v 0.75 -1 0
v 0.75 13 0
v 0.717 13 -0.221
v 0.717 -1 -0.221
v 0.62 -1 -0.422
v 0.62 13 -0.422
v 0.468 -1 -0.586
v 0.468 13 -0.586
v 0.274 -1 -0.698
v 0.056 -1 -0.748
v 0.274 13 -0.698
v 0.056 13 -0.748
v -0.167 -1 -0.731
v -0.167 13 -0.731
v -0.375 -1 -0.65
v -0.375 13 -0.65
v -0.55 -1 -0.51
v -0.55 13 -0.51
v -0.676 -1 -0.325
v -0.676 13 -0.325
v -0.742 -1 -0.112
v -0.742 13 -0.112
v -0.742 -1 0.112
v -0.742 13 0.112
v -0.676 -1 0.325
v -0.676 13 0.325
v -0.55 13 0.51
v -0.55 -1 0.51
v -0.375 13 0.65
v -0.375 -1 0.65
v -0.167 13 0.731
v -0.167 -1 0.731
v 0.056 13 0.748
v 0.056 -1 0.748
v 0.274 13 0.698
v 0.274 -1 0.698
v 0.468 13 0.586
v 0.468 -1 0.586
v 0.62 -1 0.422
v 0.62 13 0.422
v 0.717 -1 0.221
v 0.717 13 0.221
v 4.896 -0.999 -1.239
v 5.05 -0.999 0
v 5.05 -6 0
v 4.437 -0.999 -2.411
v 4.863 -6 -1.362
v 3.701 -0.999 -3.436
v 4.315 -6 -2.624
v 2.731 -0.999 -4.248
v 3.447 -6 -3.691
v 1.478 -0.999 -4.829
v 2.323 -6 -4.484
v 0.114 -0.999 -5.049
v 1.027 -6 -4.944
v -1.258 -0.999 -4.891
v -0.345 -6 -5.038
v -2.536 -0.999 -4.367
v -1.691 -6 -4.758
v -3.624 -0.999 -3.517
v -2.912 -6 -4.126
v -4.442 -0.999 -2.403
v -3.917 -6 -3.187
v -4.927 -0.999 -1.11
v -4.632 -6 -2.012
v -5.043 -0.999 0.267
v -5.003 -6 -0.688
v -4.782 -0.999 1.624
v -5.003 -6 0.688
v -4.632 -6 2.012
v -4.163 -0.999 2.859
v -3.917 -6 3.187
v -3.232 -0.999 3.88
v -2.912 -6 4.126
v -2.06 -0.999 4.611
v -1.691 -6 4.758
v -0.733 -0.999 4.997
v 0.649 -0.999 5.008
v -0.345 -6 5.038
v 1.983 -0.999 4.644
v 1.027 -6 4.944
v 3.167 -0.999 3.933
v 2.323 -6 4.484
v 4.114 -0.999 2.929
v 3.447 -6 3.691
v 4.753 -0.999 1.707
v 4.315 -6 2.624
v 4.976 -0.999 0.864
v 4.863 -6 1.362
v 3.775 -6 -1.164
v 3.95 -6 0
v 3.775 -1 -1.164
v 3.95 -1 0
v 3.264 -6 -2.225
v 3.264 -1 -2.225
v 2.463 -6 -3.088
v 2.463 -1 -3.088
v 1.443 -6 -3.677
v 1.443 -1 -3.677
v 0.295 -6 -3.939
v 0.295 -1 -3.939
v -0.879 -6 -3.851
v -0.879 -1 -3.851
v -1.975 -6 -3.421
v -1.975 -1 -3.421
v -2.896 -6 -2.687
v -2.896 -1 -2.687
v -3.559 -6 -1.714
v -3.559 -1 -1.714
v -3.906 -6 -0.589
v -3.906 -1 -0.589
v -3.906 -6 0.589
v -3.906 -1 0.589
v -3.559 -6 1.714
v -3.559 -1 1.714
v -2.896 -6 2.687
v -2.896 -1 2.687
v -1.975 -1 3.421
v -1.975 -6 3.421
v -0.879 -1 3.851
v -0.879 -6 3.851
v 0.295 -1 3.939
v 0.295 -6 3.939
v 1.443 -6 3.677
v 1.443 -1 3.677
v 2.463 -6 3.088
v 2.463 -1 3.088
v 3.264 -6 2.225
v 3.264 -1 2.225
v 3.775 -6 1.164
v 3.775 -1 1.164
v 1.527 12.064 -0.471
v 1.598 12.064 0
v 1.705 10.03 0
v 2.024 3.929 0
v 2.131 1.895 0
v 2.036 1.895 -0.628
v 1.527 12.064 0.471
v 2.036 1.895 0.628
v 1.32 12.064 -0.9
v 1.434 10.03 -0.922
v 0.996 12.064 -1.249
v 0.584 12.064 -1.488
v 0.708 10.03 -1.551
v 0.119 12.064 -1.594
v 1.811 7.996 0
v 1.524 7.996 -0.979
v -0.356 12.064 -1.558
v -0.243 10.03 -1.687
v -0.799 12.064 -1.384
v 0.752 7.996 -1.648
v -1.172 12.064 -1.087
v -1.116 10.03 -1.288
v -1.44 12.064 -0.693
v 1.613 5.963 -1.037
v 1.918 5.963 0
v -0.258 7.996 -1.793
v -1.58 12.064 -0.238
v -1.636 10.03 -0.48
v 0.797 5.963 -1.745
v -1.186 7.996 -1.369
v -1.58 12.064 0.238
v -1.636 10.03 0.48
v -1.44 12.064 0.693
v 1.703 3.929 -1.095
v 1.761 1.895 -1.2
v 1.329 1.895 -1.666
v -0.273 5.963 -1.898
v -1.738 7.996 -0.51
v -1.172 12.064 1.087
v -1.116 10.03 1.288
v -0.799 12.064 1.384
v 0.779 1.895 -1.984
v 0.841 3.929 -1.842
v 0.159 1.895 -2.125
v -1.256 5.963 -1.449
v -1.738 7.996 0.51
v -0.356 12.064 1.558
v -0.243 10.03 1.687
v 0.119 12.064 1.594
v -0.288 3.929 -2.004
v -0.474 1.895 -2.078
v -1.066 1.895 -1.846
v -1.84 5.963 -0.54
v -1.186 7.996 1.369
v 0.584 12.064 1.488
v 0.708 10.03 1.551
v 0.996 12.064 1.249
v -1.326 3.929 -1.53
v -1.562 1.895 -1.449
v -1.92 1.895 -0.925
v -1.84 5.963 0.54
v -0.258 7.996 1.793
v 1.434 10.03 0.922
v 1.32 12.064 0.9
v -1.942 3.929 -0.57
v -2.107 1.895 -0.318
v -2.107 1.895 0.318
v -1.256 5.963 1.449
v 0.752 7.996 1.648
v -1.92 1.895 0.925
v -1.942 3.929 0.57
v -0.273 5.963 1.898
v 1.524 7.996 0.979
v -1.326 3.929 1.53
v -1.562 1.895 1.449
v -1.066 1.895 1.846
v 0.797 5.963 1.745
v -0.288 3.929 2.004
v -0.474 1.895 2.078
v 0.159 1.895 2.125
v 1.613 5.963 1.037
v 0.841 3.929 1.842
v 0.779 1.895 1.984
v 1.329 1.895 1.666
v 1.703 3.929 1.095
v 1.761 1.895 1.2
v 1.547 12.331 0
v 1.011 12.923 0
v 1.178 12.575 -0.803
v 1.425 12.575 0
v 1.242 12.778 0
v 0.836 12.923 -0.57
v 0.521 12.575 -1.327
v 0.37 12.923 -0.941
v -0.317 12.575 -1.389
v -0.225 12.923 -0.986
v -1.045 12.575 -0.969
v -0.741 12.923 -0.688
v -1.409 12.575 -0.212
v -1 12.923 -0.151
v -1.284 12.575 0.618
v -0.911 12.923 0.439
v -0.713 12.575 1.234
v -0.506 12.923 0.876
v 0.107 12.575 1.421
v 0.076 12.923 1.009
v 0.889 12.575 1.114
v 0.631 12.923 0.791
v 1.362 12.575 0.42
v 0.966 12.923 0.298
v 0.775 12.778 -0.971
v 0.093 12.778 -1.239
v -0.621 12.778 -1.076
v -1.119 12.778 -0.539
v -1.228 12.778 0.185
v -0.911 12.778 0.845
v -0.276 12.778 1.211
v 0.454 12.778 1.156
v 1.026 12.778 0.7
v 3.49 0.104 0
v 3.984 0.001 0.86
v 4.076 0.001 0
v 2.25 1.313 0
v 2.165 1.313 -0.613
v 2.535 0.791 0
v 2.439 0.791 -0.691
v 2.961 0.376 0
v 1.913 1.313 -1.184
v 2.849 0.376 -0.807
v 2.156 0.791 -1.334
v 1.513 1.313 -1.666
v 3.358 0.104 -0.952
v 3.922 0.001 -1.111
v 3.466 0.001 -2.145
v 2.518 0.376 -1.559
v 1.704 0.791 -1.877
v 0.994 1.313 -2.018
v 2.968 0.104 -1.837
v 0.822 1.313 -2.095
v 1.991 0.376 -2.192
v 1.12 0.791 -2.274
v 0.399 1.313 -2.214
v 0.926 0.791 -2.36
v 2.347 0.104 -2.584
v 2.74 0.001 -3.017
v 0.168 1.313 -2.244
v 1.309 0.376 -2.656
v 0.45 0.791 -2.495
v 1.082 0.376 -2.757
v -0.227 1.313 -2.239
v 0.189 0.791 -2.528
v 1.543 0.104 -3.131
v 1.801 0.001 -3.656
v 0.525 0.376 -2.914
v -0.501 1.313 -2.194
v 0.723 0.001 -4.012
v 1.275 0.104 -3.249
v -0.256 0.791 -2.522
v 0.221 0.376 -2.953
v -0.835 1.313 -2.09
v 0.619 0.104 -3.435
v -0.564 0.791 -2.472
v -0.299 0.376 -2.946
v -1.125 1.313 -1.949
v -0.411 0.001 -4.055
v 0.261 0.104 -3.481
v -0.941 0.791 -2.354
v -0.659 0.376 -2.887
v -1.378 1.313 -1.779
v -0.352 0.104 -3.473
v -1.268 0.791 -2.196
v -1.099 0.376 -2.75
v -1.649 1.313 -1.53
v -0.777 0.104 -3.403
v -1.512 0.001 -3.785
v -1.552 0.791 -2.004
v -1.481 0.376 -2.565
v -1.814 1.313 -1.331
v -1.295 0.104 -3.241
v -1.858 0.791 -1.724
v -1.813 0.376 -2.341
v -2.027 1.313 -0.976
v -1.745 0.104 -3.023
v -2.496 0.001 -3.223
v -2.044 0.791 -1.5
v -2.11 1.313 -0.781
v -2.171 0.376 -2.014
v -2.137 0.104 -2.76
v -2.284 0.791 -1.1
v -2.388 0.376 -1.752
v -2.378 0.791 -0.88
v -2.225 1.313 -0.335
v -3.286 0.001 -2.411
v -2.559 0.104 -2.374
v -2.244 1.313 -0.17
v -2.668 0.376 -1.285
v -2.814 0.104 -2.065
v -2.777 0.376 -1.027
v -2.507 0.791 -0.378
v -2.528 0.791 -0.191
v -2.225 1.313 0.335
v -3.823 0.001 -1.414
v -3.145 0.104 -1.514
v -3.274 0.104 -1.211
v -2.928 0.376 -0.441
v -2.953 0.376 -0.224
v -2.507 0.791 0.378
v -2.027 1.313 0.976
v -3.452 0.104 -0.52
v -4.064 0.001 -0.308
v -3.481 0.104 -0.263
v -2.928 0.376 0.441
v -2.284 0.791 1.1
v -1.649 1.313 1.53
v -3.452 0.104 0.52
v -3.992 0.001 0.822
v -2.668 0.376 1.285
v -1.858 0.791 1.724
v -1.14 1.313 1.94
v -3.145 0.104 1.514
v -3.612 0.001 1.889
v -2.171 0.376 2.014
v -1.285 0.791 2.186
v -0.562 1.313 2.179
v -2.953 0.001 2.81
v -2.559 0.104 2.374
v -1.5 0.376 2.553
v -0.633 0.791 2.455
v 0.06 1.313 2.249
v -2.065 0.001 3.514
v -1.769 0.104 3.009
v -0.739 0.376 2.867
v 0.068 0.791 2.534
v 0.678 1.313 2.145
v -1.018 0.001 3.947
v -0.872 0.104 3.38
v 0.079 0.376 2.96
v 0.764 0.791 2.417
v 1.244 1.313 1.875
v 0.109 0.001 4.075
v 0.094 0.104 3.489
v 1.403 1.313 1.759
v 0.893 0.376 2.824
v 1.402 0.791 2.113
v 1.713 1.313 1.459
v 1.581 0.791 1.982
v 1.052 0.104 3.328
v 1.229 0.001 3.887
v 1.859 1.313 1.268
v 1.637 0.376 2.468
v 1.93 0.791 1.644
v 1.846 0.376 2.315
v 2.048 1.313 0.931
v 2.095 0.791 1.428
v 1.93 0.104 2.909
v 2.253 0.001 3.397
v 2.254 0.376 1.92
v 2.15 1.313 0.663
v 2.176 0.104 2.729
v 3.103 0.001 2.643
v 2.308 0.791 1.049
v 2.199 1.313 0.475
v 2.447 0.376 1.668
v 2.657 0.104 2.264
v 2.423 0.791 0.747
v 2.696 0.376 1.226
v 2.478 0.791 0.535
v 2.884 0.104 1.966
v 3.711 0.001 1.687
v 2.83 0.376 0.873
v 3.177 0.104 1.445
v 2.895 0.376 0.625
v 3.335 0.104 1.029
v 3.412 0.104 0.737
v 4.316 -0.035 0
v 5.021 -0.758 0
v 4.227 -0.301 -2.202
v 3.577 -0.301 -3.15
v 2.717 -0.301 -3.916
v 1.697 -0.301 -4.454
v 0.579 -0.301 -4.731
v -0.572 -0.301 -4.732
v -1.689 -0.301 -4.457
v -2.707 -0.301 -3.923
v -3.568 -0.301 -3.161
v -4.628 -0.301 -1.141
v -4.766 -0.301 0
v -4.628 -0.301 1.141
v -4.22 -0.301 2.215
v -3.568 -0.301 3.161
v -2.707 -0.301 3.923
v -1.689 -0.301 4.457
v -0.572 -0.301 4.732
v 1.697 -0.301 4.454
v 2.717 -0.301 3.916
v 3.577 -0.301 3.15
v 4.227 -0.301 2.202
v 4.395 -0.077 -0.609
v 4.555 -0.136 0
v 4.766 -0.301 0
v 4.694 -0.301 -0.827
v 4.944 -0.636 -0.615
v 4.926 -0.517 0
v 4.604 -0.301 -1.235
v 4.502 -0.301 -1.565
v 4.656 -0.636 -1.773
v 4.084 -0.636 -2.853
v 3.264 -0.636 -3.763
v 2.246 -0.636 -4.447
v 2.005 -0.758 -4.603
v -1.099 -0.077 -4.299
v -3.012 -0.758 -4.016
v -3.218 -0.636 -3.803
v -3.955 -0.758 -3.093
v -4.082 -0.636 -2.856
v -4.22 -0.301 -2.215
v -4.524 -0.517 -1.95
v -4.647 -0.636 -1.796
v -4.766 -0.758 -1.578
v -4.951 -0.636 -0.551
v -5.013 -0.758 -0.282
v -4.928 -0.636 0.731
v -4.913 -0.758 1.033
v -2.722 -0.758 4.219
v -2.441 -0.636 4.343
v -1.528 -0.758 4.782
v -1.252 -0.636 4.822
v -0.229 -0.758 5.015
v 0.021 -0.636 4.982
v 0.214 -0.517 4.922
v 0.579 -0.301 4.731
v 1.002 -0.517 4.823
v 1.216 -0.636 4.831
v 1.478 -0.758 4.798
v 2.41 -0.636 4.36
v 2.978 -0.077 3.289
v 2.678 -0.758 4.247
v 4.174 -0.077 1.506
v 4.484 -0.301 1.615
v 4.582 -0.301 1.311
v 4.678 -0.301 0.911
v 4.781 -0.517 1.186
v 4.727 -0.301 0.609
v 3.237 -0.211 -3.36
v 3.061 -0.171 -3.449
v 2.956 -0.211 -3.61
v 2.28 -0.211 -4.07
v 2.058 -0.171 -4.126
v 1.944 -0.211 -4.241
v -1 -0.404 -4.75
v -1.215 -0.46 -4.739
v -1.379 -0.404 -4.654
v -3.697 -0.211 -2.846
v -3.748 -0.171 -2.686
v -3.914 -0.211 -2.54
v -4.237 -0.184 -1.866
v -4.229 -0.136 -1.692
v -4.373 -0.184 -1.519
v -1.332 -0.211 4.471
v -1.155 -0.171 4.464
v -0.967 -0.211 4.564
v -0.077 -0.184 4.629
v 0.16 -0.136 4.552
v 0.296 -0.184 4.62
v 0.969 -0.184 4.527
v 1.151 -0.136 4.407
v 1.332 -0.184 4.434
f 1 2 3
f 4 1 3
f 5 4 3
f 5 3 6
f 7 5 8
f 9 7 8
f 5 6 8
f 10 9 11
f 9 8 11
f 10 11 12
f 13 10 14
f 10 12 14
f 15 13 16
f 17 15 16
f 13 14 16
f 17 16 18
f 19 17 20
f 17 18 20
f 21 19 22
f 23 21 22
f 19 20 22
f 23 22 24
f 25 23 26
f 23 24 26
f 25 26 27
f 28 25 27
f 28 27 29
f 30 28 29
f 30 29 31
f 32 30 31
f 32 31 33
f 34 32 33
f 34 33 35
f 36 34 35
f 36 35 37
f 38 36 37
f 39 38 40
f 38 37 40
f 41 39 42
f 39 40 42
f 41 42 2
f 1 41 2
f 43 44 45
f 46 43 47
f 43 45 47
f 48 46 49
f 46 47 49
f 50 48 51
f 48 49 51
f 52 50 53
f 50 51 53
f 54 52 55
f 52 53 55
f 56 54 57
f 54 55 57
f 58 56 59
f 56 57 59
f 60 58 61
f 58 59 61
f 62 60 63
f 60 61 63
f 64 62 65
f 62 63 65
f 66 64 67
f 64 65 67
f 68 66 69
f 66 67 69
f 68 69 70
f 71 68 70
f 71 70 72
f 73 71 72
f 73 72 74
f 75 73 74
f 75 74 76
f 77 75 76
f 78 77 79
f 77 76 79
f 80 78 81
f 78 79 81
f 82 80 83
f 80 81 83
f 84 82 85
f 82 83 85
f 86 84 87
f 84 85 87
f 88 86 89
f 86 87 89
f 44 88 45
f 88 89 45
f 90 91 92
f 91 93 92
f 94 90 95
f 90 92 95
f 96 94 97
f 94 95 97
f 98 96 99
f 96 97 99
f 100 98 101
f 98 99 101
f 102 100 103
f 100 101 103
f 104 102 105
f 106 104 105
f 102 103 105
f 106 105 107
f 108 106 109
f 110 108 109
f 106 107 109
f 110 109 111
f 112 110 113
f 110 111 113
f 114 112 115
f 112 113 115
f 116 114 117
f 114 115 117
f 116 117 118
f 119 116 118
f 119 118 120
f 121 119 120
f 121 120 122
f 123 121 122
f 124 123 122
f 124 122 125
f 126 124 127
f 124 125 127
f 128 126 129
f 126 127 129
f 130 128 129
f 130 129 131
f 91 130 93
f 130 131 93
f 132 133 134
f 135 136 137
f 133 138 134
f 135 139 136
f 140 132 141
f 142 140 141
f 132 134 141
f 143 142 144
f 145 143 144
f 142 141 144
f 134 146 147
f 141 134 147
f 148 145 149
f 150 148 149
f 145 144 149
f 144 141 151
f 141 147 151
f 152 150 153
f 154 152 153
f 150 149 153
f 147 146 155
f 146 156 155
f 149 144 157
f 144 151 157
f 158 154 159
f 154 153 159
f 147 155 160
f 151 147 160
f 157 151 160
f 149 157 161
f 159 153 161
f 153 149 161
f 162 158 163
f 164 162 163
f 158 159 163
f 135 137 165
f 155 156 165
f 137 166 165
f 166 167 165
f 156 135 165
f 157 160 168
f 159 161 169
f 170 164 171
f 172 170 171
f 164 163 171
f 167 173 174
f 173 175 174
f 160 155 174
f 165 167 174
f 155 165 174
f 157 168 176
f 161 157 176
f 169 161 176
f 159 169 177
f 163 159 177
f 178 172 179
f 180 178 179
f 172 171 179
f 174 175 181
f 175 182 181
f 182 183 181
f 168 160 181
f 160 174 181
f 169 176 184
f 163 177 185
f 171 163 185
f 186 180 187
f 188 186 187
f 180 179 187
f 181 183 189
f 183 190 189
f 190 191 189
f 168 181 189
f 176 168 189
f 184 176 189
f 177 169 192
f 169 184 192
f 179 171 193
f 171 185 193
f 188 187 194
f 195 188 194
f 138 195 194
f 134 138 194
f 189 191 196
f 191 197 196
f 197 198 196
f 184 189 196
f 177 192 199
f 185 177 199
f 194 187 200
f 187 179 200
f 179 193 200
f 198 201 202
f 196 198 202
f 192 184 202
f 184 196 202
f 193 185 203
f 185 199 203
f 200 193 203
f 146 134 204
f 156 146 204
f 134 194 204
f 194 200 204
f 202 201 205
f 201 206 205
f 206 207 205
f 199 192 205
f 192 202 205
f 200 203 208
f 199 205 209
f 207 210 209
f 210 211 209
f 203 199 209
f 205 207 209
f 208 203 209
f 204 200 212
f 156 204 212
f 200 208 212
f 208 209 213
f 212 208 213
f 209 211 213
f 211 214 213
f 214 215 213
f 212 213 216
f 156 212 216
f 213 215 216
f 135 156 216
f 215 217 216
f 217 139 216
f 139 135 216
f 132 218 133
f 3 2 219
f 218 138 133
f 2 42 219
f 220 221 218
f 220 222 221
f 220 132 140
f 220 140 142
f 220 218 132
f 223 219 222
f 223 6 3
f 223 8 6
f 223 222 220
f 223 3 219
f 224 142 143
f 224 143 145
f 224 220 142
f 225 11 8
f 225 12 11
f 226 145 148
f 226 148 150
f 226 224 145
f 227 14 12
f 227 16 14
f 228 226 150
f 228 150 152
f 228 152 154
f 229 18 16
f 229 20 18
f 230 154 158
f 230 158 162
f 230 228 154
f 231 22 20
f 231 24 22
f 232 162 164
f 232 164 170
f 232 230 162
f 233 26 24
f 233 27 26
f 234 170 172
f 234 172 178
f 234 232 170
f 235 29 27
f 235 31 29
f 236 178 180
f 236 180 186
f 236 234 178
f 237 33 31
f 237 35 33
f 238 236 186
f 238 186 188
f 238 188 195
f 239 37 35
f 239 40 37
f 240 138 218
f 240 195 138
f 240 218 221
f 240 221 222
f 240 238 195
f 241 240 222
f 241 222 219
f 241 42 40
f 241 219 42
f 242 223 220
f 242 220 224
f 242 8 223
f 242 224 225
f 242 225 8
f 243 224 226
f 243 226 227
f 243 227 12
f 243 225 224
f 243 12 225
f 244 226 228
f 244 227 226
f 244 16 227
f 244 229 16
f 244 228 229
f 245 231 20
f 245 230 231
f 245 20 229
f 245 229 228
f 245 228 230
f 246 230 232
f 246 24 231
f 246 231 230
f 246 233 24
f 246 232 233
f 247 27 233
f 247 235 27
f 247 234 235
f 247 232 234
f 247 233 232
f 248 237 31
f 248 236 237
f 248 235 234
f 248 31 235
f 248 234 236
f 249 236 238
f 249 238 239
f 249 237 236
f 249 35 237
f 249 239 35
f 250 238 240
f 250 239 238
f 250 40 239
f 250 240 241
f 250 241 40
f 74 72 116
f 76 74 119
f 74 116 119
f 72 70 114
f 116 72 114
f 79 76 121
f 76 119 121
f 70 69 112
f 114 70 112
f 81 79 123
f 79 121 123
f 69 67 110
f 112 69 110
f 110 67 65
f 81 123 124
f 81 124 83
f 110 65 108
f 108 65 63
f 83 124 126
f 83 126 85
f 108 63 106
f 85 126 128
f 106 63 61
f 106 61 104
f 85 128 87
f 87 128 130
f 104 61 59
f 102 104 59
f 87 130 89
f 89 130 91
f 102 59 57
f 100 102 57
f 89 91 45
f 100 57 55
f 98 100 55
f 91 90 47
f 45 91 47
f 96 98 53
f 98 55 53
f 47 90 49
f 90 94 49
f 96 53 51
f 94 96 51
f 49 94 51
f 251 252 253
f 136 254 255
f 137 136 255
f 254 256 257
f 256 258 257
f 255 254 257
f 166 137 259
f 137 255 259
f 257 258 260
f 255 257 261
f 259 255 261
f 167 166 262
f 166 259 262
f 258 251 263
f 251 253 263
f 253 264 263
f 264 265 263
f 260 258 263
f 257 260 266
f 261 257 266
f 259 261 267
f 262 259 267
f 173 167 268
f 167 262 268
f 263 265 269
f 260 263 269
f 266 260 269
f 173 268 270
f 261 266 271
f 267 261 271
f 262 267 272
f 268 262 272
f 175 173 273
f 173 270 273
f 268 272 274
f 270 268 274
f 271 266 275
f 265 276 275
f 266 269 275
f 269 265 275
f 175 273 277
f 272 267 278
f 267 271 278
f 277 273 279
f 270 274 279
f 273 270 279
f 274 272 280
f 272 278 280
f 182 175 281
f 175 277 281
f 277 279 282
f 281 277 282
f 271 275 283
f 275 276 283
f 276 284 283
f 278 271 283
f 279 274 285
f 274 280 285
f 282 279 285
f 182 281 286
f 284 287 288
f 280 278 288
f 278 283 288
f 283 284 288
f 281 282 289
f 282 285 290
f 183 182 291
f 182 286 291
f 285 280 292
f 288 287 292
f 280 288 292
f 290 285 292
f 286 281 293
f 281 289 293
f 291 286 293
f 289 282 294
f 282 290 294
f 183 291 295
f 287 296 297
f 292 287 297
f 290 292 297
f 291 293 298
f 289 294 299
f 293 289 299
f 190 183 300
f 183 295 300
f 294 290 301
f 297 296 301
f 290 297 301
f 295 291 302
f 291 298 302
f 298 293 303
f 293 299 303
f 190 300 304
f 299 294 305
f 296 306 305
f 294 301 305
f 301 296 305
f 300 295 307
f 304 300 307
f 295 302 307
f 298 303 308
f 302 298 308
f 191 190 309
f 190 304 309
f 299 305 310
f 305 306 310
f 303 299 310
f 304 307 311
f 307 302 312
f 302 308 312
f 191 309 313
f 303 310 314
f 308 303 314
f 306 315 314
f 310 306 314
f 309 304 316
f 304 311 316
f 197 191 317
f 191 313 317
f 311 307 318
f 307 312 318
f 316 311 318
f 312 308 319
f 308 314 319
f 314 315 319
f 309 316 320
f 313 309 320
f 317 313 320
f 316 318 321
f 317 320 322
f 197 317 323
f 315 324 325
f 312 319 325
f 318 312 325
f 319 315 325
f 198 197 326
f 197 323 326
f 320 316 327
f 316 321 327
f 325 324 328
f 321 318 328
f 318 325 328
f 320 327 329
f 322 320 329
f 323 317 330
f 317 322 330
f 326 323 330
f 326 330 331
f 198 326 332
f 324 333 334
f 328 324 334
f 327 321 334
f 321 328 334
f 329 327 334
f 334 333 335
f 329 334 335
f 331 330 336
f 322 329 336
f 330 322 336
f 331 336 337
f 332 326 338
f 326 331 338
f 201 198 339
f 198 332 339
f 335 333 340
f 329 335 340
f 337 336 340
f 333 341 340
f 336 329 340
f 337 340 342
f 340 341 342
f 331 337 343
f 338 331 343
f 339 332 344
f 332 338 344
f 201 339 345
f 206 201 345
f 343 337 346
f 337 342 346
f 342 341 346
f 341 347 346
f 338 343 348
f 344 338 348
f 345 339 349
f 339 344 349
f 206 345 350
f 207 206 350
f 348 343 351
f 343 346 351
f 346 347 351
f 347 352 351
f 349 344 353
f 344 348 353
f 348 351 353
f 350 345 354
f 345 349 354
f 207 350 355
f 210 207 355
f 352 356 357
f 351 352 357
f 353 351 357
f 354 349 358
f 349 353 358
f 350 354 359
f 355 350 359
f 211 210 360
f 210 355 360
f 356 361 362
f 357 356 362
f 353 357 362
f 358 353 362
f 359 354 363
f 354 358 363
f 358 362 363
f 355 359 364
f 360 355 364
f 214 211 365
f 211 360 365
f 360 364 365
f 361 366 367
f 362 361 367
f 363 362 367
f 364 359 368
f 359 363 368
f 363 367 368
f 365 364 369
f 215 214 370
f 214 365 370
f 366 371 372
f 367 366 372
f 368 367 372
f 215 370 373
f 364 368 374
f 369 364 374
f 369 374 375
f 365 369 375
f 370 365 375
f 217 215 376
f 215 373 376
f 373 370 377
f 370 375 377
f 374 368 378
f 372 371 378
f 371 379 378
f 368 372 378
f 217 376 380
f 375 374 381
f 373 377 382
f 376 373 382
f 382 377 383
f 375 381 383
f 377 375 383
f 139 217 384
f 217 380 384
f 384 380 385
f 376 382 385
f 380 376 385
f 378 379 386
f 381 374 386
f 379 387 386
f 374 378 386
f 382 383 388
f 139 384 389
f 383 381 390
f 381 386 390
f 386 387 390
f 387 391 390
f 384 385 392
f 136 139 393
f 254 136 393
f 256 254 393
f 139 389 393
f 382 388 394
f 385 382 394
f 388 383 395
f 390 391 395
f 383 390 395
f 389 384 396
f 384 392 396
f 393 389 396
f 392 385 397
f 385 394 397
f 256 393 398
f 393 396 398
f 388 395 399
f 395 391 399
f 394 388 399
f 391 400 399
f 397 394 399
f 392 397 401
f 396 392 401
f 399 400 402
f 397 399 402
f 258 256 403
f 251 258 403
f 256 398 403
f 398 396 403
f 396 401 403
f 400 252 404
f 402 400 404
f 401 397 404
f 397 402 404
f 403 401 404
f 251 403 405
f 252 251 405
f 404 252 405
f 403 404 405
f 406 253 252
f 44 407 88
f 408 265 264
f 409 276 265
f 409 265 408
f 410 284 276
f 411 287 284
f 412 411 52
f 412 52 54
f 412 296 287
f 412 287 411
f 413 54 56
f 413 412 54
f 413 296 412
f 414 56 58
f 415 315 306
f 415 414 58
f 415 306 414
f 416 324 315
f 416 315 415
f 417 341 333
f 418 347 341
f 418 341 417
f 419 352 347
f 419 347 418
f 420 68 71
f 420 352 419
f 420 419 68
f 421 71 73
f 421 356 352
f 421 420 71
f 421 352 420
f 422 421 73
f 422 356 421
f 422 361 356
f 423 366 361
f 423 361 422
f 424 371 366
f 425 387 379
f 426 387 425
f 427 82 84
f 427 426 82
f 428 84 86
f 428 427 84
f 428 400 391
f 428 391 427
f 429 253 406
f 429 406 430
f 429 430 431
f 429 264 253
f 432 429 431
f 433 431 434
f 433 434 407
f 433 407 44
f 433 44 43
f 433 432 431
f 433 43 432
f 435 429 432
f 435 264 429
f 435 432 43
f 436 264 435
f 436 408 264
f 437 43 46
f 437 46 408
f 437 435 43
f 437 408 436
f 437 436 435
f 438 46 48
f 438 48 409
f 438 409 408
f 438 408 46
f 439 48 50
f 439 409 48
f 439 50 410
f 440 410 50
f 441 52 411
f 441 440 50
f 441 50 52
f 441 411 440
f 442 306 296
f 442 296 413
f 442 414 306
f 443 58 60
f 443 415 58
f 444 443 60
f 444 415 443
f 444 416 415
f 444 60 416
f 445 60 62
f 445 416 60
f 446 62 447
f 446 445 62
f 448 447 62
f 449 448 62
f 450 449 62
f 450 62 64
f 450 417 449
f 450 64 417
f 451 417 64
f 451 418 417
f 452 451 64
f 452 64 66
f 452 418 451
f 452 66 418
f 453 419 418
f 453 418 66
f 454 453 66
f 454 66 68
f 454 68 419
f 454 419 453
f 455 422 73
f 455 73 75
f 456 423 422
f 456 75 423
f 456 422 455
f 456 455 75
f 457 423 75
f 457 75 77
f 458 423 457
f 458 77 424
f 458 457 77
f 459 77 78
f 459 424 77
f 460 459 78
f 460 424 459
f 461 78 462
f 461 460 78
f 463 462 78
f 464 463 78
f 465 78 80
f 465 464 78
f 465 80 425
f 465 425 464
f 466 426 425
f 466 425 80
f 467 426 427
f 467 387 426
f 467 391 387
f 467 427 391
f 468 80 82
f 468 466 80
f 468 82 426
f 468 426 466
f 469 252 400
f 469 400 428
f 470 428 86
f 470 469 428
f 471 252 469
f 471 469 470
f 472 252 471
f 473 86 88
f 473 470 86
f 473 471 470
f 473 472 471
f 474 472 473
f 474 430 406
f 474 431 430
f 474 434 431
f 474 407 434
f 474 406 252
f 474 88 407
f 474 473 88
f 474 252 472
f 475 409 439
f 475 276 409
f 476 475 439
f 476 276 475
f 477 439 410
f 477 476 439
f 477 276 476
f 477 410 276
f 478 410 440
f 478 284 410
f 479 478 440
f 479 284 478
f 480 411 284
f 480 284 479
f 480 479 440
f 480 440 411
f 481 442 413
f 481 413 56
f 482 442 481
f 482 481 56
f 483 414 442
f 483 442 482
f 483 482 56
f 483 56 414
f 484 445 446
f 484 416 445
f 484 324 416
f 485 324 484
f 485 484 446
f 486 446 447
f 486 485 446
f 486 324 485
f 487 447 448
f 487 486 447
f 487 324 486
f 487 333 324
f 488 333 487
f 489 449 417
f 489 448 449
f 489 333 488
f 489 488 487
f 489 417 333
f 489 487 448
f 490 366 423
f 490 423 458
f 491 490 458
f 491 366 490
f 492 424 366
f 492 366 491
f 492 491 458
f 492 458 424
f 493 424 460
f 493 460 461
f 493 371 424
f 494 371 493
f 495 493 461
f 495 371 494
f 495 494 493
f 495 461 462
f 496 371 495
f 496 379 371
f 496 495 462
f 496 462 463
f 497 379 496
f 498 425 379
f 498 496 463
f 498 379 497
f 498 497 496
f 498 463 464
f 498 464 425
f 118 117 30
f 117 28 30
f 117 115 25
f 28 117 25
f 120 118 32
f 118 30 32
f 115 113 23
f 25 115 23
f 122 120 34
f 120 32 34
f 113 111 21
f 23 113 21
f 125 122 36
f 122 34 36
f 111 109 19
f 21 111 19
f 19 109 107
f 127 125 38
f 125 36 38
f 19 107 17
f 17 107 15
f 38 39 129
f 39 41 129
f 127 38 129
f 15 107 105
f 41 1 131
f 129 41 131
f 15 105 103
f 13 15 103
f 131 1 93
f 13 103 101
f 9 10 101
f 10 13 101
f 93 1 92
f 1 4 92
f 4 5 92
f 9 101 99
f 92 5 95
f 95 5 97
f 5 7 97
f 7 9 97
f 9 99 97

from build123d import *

# Parameters (mm, degrees)
FILLET2_R = 2
FILLET3_R = 1
FILLET4_R = 1


with BuildPart() as part:
    # Sketch2 → Revolve1 (revolve)
    with BuildSketch(Plane.XY, mode=Mode.PRIVATE) as revolve1_sk:
        Polygon((-1.55, 12.982183952), (-2.230367431, 0), (-5.05, 0), (-5.05, -6), (-3.95, -6), (-3.95, -1), (-0.75, -1), (-0.75, 13), align=None)
    revolve(revolve1_sk.sketch.rotate(Axis((0, -1000, 0), (0, 1, 0)), 180), axis=Axis((0, -1000, 0), (0, 1, 0)))

    # Fillet2
    fillet2_edges = [part.edges().sort_by_distance(p)[0] for p in [
        (-2.230367431, 0, 0),
    ]]
    fillet(fillet2_edges, radius=FILLET2_R)

    # Fillet3
    fillet3_edges = [part.edges().sort_by_distance(p)[0] for p in [
        (-5.05, 0, 0),
    ]]
    fillet(fillet3_edges, radius=FILLET3_R)

    # Fillet4
    # the kernel refuses this fillet: 1 mm, written as the material it takes off along each edge
    with BuildSketch(Plane(origin=(0, 12.982183952, 0), x_dir=(1, 0, 0), z_dir=(0, 0, 1))) as fillet4_piece_1:
        with BuildLine():
            CenterArc((0.599504848, -0.970794699), FILLET4_R, 3, 78.344377595)
            Line((0.75, 0.017816048), (0.753009903, 0.037588263))
            ThreePointArc((0.753009903, 0.037588263), (1.150445291, 0.028903066), (1.550445291, 0.019995042))
            Line((1.550445291, 0.019995042), (1.569972591, 0.001046719))
            Line((1.569972591, 0.001046719), (1.618106974, -0.917412024))
            Line((1.618106974, -0.917412024), (1.598134383, -0.918458743))
        make_face()
    revolve(axis=Axis((0, 12.982183952, 0), (0, 1, 0)), mode=Mode.SUBTRACT)


solid = part.part
